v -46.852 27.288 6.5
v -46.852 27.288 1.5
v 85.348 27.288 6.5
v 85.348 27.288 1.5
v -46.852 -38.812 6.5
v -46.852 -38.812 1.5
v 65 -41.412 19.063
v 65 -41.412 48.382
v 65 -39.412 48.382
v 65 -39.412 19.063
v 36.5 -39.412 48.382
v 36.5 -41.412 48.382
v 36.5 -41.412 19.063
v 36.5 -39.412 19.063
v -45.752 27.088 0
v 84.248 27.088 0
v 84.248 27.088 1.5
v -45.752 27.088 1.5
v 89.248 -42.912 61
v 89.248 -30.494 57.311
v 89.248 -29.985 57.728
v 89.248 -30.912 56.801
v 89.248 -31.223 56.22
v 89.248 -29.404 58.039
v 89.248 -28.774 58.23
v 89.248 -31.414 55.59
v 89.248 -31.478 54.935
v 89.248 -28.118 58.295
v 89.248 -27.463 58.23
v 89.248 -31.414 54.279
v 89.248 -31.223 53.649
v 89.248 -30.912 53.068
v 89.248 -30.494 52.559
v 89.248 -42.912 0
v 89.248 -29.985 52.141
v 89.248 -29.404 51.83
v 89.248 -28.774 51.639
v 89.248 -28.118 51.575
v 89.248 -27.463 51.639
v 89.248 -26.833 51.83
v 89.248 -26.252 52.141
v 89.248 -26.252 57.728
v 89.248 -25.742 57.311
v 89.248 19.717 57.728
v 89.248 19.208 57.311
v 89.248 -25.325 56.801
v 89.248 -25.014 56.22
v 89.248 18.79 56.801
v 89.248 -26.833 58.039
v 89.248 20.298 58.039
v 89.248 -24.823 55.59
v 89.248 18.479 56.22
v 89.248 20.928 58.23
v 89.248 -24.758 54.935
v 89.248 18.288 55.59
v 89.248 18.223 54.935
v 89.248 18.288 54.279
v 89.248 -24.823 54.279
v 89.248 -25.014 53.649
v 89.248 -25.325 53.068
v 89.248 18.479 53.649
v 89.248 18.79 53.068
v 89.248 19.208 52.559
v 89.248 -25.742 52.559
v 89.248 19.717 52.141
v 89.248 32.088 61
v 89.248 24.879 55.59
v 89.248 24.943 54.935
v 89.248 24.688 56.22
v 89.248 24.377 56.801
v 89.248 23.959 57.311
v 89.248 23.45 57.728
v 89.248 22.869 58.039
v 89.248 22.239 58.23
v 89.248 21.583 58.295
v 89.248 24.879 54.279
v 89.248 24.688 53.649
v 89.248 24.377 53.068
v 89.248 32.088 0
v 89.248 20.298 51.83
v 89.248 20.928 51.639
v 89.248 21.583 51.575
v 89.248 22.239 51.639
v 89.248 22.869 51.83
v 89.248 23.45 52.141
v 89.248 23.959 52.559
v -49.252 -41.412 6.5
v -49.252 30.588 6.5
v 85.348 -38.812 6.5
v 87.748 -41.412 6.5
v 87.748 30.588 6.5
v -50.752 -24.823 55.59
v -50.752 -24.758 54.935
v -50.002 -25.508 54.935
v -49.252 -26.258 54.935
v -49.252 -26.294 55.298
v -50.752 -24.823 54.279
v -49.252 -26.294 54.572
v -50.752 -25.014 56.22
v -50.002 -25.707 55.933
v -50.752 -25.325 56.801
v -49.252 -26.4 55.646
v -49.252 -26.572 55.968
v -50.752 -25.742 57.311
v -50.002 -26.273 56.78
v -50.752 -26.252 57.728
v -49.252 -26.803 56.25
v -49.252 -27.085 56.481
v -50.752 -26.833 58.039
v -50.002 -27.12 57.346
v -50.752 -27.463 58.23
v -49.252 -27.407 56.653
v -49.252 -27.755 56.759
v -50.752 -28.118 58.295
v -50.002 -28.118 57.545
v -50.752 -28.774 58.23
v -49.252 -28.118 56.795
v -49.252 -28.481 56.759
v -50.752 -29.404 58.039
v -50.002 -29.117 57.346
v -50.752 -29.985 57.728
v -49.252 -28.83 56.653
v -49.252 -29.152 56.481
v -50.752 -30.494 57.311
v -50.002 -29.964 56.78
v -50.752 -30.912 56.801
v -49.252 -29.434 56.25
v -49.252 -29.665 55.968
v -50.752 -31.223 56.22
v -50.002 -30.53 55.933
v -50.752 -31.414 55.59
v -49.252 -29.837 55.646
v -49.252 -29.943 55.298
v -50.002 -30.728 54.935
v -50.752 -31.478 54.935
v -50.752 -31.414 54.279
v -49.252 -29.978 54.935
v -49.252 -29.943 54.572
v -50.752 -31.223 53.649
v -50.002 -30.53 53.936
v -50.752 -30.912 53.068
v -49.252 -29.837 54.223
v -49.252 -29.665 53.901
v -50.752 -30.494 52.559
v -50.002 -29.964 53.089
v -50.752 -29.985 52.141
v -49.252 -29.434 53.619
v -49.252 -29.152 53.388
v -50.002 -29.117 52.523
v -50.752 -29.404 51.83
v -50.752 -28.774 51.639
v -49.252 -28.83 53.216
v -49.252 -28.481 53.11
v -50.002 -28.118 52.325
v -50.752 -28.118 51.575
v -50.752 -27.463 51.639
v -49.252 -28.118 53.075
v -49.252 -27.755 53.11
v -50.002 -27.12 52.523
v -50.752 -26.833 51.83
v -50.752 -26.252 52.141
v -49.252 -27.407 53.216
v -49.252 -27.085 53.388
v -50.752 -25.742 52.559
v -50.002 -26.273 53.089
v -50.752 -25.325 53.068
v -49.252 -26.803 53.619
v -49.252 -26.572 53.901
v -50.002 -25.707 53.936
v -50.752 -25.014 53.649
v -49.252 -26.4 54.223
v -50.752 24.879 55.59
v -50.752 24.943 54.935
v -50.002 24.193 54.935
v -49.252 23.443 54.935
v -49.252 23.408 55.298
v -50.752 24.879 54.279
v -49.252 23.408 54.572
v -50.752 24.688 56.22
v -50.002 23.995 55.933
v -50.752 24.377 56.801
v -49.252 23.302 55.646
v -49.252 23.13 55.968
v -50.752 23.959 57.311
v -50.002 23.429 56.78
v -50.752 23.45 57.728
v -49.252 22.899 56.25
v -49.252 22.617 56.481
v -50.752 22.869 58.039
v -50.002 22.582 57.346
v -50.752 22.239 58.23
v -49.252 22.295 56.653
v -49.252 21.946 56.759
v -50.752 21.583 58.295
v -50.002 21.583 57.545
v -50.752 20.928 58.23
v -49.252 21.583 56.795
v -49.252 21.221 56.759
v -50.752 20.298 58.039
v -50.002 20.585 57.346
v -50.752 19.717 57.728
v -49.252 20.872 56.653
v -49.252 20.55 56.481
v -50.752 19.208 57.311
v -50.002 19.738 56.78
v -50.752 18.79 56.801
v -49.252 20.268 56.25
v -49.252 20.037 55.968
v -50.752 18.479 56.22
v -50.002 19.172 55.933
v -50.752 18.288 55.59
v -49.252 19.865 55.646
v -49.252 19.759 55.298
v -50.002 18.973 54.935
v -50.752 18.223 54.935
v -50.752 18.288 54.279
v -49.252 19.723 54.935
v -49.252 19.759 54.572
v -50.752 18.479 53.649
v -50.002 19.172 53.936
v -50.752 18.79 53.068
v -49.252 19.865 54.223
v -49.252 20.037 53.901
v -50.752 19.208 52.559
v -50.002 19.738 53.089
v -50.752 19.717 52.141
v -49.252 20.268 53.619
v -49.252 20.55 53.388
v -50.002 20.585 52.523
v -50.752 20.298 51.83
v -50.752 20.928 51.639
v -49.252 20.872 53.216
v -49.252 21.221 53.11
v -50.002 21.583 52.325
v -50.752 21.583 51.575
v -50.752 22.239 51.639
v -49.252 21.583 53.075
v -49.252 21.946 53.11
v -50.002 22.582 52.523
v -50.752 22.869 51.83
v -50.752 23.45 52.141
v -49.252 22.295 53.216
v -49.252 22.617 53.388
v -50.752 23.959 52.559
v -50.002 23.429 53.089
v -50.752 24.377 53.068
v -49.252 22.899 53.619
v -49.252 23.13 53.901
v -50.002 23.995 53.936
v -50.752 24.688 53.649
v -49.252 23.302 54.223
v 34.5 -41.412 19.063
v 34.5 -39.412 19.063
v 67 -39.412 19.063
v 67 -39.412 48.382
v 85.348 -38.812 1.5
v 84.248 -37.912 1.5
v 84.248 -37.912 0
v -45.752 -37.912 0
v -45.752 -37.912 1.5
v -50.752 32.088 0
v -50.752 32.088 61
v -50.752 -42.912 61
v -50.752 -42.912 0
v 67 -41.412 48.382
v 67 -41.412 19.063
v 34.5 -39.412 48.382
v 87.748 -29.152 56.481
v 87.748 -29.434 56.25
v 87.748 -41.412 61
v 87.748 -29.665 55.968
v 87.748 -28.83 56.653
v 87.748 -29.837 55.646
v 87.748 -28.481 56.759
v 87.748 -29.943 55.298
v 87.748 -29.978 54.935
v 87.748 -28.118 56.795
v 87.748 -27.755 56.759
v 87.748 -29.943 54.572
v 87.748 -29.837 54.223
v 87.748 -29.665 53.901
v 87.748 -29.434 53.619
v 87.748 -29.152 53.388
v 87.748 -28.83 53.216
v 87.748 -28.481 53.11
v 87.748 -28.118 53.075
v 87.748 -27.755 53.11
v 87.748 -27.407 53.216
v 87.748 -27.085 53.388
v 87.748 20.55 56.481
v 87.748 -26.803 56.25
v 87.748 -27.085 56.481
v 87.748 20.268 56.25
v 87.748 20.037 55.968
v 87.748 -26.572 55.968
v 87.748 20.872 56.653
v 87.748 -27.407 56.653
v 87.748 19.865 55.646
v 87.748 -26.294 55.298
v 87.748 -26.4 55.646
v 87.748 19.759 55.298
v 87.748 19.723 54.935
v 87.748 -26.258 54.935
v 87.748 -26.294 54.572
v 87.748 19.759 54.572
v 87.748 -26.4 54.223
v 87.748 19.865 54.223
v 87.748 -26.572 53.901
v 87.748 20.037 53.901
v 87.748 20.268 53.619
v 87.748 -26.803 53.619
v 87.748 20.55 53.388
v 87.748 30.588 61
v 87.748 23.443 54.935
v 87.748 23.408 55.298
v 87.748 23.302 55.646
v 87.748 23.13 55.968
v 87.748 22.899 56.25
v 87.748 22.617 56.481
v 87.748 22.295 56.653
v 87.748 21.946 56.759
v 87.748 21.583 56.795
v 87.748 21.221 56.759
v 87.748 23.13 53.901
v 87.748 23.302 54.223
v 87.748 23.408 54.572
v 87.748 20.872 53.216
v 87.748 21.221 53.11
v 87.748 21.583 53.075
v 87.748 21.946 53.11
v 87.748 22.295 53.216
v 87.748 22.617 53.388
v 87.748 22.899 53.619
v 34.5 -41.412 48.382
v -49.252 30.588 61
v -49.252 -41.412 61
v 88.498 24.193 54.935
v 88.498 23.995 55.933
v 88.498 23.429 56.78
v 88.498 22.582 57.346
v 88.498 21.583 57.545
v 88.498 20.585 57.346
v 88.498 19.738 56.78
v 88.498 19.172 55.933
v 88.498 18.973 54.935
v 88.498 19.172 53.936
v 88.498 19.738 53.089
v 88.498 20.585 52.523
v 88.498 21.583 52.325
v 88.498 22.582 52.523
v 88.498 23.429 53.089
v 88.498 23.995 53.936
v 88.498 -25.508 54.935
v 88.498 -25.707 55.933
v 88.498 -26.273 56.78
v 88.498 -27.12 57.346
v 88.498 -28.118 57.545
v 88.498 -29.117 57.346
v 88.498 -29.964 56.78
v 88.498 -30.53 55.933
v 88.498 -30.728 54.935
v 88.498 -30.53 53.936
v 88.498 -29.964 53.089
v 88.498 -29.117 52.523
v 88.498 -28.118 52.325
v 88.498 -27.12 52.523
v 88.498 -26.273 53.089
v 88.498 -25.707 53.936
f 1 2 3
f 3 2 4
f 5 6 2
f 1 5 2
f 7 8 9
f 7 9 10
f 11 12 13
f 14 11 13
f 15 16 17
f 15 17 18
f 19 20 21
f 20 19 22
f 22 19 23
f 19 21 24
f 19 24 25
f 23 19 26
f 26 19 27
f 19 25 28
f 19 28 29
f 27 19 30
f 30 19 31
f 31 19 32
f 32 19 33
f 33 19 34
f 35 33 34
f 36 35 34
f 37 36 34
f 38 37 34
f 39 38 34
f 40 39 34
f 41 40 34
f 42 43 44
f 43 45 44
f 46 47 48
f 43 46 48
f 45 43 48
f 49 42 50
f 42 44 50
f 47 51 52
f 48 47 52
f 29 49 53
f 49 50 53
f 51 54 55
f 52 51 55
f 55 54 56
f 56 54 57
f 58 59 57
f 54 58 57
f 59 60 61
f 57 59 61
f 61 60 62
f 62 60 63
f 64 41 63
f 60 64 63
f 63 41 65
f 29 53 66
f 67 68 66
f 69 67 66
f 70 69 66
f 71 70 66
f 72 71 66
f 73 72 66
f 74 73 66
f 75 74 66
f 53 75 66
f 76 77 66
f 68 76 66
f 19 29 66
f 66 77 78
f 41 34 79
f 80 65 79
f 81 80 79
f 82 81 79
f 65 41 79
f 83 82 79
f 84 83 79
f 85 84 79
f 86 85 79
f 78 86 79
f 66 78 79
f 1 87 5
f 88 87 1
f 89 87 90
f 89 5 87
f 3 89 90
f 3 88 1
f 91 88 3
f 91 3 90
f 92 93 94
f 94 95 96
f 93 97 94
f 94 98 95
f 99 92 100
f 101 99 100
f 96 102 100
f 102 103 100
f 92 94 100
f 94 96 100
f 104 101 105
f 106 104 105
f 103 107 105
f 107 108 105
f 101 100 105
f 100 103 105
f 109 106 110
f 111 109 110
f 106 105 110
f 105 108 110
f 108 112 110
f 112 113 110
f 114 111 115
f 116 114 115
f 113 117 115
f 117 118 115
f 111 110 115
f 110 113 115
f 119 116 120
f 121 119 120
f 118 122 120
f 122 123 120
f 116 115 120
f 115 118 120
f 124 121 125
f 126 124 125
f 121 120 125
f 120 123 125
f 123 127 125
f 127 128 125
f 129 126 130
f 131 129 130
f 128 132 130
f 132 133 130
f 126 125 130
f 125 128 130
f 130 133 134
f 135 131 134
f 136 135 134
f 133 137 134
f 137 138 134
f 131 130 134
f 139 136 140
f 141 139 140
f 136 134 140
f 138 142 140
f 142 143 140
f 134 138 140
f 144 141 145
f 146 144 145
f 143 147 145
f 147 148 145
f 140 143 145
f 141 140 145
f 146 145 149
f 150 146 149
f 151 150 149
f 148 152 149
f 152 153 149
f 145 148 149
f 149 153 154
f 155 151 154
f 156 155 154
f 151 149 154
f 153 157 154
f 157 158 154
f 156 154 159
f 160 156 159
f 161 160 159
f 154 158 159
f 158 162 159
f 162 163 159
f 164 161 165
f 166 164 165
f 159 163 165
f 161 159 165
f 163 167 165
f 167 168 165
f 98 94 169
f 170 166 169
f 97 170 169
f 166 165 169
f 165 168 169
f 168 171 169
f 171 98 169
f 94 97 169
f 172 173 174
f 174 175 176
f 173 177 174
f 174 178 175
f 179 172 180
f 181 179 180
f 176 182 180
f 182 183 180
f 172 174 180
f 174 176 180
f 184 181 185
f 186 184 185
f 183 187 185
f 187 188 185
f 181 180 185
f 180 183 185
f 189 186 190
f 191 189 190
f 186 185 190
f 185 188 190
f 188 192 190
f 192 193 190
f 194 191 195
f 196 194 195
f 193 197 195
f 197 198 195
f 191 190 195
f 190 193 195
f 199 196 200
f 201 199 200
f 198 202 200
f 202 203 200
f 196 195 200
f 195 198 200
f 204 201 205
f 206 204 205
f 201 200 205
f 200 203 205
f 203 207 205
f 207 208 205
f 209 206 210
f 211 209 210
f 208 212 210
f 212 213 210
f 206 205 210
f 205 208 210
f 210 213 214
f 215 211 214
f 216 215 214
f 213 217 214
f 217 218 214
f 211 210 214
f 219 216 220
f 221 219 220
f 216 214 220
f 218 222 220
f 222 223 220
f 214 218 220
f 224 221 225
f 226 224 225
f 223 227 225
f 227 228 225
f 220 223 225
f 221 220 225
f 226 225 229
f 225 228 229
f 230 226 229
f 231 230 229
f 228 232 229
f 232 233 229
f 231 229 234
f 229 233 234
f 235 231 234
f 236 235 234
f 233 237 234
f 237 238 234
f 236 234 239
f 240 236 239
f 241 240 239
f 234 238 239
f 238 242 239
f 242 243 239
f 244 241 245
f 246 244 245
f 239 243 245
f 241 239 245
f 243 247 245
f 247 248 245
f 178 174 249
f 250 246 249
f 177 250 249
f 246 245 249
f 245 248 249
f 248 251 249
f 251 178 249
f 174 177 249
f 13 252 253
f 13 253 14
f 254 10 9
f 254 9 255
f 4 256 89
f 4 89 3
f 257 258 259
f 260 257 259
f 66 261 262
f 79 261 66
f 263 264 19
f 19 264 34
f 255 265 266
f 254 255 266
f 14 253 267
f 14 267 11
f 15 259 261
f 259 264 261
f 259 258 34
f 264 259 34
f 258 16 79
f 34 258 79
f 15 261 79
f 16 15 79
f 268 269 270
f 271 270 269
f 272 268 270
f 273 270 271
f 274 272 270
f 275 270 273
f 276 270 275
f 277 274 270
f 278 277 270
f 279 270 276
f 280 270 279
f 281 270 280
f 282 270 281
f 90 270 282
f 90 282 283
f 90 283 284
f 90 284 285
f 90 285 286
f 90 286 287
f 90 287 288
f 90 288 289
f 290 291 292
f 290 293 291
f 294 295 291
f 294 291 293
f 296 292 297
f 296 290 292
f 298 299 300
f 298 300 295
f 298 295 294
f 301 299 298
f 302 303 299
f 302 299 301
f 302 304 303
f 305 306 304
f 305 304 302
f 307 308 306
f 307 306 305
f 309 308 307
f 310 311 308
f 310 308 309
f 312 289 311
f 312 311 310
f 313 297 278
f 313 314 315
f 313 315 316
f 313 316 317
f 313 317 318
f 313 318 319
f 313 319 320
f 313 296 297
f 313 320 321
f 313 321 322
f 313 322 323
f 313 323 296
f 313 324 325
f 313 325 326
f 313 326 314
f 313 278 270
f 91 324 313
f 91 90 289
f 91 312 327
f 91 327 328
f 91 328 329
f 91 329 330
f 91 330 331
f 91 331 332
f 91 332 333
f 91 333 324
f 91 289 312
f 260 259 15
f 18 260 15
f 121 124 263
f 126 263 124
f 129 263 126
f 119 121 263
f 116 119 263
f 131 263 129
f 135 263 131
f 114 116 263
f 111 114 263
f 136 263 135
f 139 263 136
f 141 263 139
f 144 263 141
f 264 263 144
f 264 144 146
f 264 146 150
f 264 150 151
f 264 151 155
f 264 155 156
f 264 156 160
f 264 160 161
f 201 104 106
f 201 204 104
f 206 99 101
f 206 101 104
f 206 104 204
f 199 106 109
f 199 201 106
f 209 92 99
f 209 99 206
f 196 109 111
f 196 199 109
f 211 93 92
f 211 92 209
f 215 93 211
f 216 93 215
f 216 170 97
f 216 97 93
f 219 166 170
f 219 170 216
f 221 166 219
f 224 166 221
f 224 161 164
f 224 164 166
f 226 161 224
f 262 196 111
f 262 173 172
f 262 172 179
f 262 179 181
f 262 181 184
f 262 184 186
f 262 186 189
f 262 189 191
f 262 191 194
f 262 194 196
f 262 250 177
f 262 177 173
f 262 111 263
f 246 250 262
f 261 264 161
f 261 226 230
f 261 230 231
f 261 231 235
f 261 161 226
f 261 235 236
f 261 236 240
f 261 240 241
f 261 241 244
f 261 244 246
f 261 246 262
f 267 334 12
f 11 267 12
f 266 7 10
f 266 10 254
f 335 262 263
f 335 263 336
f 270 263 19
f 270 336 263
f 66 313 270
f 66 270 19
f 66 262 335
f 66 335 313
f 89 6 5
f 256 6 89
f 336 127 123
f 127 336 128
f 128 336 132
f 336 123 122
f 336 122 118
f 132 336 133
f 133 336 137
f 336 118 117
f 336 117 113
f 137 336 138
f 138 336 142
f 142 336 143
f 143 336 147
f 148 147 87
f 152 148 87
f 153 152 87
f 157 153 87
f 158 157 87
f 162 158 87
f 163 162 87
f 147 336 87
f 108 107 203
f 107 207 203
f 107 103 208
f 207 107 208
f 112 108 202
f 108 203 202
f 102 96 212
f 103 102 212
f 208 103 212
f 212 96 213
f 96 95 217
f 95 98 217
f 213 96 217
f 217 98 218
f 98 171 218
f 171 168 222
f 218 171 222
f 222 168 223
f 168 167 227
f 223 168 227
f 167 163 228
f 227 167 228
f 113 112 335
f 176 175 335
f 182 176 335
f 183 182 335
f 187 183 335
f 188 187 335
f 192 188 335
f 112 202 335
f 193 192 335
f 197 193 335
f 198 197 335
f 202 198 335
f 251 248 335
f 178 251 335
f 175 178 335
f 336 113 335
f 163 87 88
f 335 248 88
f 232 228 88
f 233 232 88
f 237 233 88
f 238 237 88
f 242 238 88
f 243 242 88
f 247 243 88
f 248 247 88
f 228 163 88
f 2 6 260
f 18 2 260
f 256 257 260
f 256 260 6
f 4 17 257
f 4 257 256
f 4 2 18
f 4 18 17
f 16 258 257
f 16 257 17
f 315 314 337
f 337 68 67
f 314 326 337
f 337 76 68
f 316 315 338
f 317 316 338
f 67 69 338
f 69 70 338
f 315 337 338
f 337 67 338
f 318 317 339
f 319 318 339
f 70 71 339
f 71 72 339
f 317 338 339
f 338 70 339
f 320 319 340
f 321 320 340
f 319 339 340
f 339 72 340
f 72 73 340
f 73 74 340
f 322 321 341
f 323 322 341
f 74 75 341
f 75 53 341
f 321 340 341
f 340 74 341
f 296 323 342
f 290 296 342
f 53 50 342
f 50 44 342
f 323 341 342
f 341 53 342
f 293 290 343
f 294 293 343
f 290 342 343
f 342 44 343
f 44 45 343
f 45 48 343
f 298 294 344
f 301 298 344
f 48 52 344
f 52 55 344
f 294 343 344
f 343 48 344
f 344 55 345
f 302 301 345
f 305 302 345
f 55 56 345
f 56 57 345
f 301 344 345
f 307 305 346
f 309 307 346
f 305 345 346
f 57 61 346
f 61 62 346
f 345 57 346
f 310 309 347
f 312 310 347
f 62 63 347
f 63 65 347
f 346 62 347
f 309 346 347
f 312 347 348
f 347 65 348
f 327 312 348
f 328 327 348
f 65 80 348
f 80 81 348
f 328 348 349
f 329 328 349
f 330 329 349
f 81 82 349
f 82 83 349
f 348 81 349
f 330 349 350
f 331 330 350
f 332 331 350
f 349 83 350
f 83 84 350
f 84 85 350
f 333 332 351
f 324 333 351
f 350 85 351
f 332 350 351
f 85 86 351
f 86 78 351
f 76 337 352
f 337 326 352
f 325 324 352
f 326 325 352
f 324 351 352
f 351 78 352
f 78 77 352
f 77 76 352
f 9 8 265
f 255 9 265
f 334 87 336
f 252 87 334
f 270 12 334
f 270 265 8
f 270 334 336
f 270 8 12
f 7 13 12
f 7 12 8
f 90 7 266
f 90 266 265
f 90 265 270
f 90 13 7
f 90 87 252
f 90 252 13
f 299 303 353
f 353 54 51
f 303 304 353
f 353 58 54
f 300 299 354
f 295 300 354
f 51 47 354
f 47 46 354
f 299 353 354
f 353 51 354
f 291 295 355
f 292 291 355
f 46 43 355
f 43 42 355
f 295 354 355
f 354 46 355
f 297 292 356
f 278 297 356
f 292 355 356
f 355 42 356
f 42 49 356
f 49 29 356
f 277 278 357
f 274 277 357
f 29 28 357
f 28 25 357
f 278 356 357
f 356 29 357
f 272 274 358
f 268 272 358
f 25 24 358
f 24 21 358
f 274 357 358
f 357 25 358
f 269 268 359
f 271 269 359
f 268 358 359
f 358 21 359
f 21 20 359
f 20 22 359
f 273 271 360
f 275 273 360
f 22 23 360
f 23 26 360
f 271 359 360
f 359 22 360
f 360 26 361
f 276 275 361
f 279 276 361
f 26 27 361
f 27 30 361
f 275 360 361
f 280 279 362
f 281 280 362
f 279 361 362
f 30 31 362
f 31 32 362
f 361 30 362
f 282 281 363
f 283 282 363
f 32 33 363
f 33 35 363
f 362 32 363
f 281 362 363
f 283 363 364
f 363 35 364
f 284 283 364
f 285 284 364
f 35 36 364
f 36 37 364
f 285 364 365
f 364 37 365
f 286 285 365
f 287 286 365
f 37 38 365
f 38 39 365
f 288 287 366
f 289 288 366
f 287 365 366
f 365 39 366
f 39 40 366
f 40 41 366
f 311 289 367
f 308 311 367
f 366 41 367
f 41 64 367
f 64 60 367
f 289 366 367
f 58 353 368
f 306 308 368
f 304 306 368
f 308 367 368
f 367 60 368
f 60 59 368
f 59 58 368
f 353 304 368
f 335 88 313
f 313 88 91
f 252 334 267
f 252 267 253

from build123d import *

# Parameters (mm, degrees)
SKETCH_1_W          = 140
SKETCH_1_H          = 75
EXTRUDE_1_DEPTH     = 61
SHELL_1_T           = -1.5
SKETCH_3_W          = 130
SKETCH_3_H          = 65
CUT_EXTRUDE_1_DEPTH = 117.308601118
SKETCH_4_W          = 137
SKETCH_4_H          = 2.6
SKETCH_4_H_2        = 3.3
EXTRUDE_2_DEPTH     = 5
SKETCH_5_W          = 2.4
SKETCH_5_H          = 69.4
EXTRUDE_3_DEPTH     = 5
SKETCH_29_W         = 2
SKETCH_29_H         = 29.319547491
EXTRUDE_4_DEPTH     = 2


# Read off the part's stored shape, not the designer's step: M3 六角凹锥坑螺钉的锥形沉头孔1, M3 六角凹锥坑螺钉的锥形沉头孔2
with BuildPart() as part:
    # 草图1 → 凸台-拉伸1 (new body)
    with BuildSketch(Plane.XY):
        with Locations((19.248188406, -5.412137681)):
            Rectangle(SKETCH_1_W, SKETCH_1_H)
    extrude(amount=EXTRUDE_1_DEPTH)

    # 抽壳1
    shell_1_openings = [part.faces().sort_by_distance(p)[0] for p in [
        (19.248188406, -5.412137681, 61),
    ]]
    offset(amount=SHELL_1_T, openings=shell_1_openings, kind=Kind.INTERSECTION)

    # 草图3 → 切除-拉伸1 (cut, through all)
    with BuildSketch(Plane(origin=(0, 0, 0), x_dir=(-1, 0, 0), z_dir=(0, 0, -1))):
        with Locations((-19.248188406, -5.412137681)):
            Rectangle(SKETCH_3_W, SKETCH_3_H)
    extrude(amount=-CUT_EXTRUDE_1_DEPTH, mode=Mode.SUBTRACT)

    # 草图4 → 凸台-拉伸2 (add)
    with BuildSketch(Plane.XY.offset(1.5)):
        with Locations((19.248188406, -40.112137681)):
            Rectangle(SKETCH_4_W, SKETCH_4_H)
        with Locations((19.248188406, 28.937862319)):
            Rectangle(SKETCH_4_W, SKETCH_4_H_2)
    extrude(amount=EXTRUDE_2_DEPTH)

    # 草图5 → 凸台-拉伸3 (add)
    with BuildSketch(Plane.XY.offset(1.5)):
        with Locations((-48.051811594, -4.112137681)):
            Rectangle(SKETCH_5_W, SKETCH_5_H)
        with Locations((86.548188406, -4.112137681)):
            Rectangle(SKETCH_5_W, SKETCH_5_H)
    extrude(amount=EXTRUDE_3_DEPTH)

    # M3 六角凹锥坑螺钉的锥形沉头孔1 outline → M3 六角凹锥坑螺钉的锥形沉头孔1 (revolve, cut)
    with BuildSketch(Plane(origin=(0, -28.118319618, 54.934676649), x_dir=(0, 1, 0), z_dir=(0, 0, -1))):
        Polygon((0, -50.751811594), (3.36, -50.751811594), (1.86, -49.251811594), (0, -49.251811594), align=None)
    revolve(axis=Axis((0, -28.118319618, 54.934676649), (1, 0, 0)), mode=Mode.SUBTRACT)

    # Hole Wizard M3 _1 2 outline → Hole Wizard M3 _1 2 (revolve, cut)
    with BuildSketch(Plane(origin=(0, 21.583463225, 54.934676649), x_dir=(0, 1, 0), z_dir=(0, 0, -1))):
        Polygon((0, -50.751811594), (3.36, -50.751811594), (1.86, -49.251811594), (0, -49.251811594), align=None)
    revolve(axis=Axis((0, 21.583463225, 54.934676649), (1, 0, 0)), mode=Mode.SUBTRACT)

    # M3 六角凹锥坑螺钉的锥形沉头孔2 outline → M3 六角凹锥坑螺钉的锥形沉头孔2 (revolve, cut)
    with BuildSketch(Plane(origin=(0, -28.118319618, 54.934676649), x_dir=(0, 1, 0), z_dir=(0, 0, -1))):
        Polygon((3.36, 89.248188406), (0, 89.248188406), (0, 87.748188406), (1.86, 87.748188406), align=None)
    revolve(axis=Axis((0, -28.118319618, 54.934676649), (1, 0, 0)), mode=Mode.SUBTRACT)

    # Hole Wizard M3 _2 2 outline → Hole Wizard M3 _2 2 (revolve, cut)
    with BuildSketch(Plane(origin=(0, 21.583463225, 54.934676649), x_dir=(0, 1, 0), z_dir=(0, 0, -1))):
        Polygon((3.36, 89.248188406), (0, 89.248188406), (0, 87.748188406), (1.86, 87.748188406), align=None)
    revolve(axis=Axis((0, 21.583463225, 54.934676649), (1, 0, 0)), mode=Mode.SUBTRACT)

    # 草图29 → 凸台-拉伸4 (add)
    with BuildSketch(Plane(origin=(0, -41.412137681, 0), x_dir=(1, 0, 0), z_dir=(0, 1, 0))):
        with Locations((35.5, -33.722670624)):
            Rectangle(SKETCH_29_W, SKETCH_29_H)
        with Locations((66, -33.722670624)):
            Rectangle(SKETCH_29_W, SKETCH_29_H)
    extrude(amount=EXTRUDE_4_DEPTH)


solid = part.part
